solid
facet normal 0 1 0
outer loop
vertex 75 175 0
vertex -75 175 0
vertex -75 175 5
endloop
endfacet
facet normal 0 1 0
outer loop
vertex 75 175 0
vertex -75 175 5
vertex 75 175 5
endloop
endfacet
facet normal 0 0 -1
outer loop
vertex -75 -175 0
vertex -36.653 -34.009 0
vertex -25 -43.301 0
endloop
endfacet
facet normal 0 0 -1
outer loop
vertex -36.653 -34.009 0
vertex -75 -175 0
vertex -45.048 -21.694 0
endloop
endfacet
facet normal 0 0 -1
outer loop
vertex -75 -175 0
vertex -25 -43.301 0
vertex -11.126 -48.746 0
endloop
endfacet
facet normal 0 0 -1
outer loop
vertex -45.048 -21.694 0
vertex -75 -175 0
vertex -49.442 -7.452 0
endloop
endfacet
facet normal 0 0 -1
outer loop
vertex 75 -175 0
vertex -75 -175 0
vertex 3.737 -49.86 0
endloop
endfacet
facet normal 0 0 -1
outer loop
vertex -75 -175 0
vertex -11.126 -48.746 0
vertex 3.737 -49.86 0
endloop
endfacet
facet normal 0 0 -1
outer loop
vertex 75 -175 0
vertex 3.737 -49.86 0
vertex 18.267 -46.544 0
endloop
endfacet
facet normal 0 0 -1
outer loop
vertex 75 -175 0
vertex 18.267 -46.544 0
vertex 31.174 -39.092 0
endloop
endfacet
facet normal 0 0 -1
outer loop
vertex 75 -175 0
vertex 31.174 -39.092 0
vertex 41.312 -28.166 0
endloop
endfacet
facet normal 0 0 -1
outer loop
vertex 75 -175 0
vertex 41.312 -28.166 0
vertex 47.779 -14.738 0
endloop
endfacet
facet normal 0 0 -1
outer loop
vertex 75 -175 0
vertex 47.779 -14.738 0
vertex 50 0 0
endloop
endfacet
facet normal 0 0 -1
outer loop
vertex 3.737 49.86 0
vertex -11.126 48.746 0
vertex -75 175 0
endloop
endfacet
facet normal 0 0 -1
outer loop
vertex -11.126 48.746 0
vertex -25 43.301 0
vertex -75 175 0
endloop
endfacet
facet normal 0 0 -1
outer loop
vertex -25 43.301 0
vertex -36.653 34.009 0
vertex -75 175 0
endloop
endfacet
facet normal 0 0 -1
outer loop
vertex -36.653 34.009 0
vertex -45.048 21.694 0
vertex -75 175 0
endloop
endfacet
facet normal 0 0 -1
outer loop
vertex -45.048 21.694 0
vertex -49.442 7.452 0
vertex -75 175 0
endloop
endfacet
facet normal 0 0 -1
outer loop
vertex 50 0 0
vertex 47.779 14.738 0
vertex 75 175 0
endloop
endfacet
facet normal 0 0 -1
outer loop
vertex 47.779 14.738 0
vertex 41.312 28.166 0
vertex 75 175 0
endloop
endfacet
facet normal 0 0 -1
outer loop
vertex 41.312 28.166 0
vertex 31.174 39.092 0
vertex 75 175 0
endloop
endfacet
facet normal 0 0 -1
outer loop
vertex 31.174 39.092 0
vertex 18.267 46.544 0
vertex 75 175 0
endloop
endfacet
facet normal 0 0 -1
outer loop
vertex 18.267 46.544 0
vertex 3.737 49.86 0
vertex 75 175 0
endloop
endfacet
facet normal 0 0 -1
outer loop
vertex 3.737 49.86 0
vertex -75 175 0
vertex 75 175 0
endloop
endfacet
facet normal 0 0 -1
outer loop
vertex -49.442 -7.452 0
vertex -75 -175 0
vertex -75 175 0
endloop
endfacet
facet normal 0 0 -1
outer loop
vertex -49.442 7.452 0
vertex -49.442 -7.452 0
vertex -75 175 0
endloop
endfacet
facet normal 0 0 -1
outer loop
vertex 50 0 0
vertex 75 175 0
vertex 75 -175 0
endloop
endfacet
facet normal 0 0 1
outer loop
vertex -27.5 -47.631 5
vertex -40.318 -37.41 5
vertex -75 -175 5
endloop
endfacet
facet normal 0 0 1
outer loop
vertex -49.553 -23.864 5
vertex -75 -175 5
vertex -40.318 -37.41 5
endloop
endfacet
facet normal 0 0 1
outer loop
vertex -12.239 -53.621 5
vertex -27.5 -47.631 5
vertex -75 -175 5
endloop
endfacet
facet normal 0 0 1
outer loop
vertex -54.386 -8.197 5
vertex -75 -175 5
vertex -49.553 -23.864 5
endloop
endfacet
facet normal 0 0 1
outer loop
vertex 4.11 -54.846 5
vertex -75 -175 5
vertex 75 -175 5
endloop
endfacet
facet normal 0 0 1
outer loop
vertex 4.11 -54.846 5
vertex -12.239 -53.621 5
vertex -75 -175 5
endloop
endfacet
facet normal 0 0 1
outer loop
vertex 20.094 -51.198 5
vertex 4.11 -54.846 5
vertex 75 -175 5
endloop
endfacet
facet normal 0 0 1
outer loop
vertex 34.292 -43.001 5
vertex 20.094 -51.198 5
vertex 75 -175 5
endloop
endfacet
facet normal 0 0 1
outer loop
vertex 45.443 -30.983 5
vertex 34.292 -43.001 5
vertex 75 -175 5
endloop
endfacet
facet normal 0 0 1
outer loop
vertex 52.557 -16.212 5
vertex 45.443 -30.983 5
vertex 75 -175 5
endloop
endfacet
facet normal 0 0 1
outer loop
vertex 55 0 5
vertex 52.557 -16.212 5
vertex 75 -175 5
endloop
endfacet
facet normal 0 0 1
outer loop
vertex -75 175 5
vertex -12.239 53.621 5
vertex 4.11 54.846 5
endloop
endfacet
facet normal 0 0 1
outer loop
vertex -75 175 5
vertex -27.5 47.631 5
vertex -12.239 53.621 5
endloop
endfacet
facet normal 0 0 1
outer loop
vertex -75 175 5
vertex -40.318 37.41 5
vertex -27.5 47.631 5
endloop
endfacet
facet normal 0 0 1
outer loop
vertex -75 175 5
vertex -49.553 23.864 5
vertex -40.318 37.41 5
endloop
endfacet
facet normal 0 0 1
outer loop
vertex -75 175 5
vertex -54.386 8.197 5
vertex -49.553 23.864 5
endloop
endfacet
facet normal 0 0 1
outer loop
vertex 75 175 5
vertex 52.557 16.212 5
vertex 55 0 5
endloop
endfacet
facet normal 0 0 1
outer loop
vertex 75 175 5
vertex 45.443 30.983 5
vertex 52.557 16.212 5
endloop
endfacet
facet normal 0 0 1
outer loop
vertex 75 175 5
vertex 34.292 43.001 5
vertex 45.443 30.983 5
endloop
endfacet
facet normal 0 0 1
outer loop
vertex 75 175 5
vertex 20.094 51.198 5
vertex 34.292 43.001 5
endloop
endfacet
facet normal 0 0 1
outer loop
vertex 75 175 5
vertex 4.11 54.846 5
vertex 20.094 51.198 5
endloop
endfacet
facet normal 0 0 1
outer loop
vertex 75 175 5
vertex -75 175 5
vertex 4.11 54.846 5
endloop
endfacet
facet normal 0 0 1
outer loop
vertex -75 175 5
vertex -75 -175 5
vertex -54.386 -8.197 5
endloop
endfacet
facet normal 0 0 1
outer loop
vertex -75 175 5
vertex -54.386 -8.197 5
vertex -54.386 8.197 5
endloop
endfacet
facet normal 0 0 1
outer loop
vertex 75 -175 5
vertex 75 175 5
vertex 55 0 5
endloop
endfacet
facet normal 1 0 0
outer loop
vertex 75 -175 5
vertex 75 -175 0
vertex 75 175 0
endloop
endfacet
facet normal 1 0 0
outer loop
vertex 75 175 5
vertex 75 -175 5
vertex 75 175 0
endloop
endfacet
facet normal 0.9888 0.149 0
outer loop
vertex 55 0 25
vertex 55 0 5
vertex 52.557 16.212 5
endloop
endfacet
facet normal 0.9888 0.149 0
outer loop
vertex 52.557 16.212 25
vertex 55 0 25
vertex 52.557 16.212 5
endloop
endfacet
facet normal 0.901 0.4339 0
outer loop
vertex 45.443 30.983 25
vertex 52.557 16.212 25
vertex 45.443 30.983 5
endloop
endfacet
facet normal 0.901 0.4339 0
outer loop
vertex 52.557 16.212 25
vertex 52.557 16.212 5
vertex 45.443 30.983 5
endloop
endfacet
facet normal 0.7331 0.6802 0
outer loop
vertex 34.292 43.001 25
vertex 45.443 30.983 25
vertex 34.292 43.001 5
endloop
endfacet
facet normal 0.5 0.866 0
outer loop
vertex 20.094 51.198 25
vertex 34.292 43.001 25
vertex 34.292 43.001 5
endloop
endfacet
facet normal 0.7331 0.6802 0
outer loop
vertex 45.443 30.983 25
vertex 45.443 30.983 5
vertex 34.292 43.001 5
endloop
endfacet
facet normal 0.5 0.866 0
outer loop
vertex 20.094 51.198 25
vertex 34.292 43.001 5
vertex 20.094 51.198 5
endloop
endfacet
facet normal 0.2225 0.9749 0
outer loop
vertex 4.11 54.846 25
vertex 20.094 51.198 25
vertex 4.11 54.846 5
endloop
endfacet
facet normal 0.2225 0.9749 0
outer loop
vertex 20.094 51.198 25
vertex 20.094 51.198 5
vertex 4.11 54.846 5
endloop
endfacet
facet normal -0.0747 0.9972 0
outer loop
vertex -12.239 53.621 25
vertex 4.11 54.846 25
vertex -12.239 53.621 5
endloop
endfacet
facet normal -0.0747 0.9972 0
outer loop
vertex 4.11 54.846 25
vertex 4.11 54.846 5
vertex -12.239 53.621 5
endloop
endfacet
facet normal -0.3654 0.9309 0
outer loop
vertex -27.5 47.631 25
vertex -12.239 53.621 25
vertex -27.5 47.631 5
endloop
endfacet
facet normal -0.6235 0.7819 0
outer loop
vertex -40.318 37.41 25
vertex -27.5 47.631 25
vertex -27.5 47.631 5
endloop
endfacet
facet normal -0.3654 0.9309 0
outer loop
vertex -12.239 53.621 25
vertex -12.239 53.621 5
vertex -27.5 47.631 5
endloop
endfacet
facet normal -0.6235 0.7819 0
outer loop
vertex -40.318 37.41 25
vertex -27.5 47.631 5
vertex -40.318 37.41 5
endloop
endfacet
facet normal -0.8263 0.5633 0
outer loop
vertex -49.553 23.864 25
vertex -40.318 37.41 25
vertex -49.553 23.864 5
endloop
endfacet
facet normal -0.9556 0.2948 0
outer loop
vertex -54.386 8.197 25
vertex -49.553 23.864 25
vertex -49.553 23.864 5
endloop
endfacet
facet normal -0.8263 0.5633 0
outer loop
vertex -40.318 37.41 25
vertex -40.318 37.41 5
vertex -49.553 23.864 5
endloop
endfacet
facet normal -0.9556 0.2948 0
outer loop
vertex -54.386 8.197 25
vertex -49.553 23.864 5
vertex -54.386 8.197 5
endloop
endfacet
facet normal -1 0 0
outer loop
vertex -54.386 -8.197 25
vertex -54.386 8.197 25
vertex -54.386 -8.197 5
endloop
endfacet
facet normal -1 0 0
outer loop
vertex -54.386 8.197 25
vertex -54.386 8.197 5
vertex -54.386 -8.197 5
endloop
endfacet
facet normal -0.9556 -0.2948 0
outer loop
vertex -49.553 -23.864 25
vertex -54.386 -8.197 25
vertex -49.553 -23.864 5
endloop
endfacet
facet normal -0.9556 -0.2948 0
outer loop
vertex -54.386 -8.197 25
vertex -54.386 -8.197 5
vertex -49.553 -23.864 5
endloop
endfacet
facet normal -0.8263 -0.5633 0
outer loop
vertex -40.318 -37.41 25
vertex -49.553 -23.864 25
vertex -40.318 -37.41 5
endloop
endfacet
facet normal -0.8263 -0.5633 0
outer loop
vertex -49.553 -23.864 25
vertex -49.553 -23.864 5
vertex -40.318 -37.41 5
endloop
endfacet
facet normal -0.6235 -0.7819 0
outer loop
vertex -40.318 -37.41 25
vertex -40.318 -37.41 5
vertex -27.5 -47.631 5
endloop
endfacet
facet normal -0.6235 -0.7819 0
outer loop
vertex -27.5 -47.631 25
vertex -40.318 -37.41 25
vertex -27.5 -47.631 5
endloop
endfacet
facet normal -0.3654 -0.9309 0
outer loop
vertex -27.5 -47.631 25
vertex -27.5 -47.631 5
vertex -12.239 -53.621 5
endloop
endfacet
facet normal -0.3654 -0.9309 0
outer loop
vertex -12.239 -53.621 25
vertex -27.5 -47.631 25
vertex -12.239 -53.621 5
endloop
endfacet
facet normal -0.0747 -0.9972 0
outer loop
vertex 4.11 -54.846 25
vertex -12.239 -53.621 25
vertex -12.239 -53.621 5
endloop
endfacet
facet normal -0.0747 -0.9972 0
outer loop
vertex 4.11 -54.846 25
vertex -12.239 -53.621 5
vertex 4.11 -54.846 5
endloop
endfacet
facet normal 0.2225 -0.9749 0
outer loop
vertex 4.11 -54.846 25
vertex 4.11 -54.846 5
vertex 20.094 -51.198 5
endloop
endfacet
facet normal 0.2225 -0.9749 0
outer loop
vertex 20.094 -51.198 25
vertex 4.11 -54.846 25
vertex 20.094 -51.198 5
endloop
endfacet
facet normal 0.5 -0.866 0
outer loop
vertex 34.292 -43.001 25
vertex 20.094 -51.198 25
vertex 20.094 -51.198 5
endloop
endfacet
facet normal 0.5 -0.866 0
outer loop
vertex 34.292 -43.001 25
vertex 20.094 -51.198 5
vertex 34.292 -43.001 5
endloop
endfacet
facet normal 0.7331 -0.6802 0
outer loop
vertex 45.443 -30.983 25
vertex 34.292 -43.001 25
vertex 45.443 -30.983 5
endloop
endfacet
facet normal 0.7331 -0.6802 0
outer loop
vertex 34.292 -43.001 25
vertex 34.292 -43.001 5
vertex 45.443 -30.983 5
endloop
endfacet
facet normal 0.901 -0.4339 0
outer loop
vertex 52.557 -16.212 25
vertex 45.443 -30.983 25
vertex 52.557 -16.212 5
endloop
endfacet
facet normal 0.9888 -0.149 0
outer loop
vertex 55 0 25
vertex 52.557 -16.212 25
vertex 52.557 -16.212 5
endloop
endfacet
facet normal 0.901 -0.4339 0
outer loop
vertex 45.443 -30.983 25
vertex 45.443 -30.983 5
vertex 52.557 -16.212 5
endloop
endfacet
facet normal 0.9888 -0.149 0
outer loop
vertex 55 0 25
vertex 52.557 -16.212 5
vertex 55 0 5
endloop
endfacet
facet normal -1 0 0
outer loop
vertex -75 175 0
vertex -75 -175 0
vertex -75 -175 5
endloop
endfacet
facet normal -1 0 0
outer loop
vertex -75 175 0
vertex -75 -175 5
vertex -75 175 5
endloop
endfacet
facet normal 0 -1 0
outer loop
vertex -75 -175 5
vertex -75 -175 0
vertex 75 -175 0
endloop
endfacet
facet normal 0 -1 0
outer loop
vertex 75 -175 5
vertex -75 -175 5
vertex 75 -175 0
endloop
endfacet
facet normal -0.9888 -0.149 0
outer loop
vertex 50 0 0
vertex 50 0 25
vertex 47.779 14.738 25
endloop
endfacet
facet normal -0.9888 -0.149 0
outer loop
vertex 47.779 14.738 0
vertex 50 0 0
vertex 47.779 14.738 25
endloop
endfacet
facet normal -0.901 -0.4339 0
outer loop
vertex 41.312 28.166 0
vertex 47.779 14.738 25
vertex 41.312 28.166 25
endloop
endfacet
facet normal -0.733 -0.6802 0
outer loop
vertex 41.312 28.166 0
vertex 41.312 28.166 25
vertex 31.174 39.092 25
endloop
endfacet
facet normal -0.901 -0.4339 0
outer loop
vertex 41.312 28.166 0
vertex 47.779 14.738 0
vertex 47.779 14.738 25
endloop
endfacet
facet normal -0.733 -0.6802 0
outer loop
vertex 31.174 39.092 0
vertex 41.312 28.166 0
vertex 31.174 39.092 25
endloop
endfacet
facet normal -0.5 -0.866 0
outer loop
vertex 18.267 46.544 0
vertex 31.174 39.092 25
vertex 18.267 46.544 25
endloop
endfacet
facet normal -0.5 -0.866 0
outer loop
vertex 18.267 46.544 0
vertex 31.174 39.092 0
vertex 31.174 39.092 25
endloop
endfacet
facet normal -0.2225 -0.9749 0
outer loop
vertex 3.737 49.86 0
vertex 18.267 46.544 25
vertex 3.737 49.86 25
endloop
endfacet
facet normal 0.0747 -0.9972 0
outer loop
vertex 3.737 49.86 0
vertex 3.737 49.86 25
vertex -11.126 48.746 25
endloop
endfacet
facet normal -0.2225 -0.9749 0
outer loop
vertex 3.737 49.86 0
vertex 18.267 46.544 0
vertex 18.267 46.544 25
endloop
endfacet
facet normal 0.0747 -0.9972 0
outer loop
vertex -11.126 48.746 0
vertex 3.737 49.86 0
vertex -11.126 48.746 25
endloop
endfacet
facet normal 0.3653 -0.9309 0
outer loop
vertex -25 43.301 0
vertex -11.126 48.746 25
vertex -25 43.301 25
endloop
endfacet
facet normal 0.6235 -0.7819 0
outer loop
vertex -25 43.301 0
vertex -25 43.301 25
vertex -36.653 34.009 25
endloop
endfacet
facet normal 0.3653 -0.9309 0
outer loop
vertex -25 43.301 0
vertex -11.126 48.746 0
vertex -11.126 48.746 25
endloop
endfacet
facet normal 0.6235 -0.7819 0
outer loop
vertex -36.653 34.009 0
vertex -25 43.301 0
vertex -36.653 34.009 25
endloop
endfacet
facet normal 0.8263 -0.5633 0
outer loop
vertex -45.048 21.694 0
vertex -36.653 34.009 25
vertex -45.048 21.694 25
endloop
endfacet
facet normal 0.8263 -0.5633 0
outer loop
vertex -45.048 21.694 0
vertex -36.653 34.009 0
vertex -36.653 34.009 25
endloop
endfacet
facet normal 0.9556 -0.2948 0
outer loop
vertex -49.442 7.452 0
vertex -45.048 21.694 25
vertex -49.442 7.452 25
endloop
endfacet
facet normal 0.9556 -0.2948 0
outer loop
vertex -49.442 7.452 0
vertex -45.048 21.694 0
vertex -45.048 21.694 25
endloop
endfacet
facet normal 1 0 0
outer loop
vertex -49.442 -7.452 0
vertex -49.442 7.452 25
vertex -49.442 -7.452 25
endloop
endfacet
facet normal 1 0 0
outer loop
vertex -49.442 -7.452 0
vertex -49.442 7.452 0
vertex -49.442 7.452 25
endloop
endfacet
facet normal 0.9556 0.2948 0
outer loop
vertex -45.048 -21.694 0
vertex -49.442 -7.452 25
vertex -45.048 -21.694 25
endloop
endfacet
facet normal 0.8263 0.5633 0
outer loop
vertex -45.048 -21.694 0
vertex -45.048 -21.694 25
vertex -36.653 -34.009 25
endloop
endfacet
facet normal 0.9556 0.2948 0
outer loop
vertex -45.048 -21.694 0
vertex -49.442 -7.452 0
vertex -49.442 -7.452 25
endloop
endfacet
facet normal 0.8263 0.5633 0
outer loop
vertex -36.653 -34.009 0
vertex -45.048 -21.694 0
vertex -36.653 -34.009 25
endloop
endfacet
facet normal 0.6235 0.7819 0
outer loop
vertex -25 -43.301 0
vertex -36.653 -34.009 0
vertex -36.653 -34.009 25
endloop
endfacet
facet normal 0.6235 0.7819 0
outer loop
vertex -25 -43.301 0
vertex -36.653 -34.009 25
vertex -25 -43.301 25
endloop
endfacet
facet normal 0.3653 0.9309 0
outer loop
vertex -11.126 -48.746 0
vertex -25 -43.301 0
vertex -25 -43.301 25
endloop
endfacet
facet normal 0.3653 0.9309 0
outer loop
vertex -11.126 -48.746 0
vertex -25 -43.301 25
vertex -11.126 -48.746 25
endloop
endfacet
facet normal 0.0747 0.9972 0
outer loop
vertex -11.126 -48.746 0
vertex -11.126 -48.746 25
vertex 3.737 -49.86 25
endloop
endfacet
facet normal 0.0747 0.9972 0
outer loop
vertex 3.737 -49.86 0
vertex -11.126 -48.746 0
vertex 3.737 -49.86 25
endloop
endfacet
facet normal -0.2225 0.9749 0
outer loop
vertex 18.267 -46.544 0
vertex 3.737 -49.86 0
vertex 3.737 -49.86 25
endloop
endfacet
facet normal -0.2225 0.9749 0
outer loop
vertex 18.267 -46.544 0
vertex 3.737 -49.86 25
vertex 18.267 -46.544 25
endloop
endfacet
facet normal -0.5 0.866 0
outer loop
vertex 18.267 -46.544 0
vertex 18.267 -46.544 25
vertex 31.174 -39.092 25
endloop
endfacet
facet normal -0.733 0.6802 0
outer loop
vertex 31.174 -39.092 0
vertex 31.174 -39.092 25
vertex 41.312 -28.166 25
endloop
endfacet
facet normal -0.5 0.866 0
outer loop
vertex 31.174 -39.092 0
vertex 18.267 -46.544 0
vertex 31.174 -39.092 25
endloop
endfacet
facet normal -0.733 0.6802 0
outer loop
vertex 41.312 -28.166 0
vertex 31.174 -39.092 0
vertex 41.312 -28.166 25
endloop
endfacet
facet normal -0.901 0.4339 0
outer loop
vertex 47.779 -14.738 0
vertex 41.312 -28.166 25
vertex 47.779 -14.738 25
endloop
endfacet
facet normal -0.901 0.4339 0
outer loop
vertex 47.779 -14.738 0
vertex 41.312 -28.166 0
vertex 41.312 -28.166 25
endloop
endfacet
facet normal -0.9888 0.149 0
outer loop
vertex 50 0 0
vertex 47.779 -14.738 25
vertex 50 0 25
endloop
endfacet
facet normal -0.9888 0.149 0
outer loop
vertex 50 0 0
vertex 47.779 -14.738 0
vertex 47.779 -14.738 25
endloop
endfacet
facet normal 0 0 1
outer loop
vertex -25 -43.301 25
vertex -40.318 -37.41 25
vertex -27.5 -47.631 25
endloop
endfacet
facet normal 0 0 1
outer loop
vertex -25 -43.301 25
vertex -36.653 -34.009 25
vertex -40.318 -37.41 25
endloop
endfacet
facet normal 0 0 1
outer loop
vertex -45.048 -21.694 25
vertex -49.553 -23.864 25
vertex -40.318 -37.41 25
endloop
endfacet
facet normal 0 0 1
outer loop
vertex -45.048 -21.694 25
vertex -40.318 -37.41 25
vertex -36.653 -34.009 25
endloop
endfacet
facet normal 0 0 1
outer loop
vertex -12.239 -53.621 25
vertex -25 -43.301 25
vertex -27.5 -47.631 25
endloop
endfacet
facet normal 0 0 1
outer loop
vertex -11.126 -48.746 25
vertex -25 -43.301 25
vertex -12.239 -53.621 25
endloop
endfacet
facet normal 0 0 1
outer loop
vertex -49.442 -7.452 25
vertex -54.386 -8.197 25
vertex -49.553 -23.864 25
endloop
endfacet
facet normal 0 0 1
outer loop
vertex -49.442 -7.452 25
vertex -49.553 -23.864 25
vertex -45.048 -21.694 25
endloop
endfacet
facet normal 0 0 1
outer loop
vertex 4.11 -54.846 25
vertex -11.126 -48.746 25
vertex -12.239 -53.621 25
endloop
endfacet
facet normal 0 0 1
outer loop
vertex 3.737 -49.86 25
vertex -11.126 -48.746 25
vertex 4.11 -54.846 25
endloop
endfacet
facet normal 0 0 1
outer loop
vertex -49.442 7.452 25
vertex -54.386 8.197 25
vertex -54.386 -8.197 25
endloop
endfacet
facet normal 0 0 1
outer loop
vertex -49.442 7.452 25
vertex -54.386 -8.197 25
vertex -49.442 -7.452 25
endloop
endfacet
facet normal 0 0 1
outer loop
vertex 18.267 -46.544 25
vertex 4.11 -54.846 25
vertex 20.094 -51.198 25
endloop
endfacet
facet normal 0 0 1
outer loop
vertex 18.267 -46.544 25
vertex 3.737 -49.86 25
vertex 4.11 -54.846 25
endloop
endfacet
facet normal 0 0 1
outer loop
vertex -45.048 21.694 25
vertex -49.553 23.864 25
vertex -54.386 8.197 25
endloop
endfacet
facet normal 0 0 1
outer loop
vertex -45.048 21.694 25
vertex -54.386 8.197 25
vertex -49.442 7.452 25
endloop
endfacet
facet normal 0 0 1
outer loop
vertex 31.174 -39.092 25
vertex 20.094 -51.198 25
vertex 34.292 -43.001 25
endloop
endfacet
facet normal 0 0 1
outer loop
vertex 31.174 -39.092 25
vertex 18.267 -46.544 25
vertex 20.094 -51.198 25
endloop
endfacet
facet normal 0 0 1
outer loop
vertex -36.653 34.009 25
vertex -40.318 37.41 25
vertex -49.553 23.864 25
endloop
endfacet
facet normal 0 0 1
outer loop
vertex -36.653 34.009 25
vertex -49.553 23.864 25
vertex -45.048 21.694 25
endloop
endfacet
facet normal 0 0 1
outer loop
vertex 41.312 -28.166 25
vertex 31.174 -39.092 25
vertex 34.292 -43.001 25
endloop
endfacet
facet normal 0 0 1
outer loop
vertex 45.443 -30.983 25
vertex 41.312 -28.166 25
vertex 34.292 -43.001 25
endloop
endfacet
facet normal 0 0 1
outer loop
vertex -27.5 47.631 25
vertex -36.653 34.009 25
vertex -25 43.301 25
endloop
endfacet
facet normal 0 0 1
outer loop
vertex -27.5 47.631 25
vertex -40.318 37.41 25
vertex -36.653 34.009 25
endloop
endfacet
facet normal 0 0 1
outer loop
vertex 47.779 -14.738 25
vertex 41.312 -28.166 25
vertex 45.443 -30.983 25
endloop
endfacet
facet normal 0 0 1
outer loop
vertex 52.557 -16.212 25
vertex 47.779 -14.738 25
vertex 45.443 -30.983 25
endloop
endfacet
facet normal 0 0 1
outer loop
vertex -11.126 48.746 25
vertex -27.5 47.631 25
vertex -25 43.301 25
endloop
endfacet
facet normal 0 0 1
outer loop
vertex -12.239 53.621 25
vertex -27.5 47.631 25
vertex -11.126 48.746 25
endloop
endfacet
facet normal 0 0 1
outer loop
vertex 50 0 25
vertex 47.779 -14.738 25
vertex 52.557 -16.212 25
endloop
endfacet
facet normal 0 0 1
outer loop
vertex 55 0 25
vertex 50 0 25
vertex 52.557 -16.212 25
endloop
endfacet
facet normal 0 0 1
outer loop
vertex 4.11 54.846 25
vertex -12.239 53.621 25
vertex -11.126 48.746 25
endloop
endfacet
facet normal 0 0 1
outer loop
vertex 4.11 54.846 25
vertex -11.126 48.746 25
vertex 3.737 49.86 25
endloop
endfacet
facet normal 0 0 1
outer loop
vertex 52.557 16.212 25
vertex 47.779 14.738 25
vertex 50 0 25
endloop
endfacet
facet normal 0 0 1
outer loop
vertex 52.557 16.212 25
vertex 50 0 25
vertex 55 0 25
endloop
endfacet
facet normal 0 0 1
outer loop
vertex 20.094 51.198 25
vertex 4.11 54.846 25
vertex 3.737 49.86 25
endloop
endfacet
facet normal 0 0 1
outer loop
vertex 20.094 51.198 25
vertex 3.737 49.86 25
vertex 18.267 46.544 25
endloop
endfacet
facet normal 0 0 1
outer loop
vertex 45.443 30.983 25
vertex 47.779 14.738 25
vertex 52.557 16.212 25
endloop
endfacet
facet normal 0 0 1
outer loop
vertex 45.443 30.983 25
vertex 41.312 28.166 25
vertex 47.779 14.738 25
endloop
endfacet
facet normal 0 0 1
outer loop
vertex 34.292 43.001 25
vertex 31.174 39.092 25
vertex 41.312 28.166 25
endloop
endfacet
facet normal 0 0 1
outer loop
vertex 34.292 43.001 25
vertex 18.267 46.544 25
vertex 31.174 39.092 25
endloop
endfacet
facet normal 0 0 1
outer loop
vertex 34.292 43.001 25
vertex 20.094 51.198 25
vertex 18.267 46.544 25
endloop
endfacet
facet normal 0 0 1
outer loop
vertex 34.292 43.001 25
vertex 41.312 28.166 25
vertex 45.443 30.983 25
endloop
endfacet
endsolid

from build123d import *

# Parameters (mm, degrees)
F0_W     = 150
F0_H     = 350
F1_DEPTH = 5
F2_R     = 50
F3_DEPTH = 5
F2_R_2   = 55
F4_DEPTH = 20


with BuildPart() as f1:
    # F0 (on Top) → F1 (new body)
    with BuildSketch(Plane.XY):
        Rectangle(F0_W, F0_H)
    extrude(amount=F1_DEPTH)

    # F2 (on face) → F3 (cut, through all)
    with BuildSketch(Plane.XY.offset(5)):
        Circle(F2_R)
    extrude(amount=-F3_DEPTH, mode=Mode.SUBTRACT)

    # F2 (on face) → F4 (join)
    with BuildSketch(Plane.XY.offset(5)):
        Circle(F2_R_2)
        Circle(F2_R, mode=Mode.SUBTRACT)
    extrude(amount=F4_DEPTH)


solid = f1.part
